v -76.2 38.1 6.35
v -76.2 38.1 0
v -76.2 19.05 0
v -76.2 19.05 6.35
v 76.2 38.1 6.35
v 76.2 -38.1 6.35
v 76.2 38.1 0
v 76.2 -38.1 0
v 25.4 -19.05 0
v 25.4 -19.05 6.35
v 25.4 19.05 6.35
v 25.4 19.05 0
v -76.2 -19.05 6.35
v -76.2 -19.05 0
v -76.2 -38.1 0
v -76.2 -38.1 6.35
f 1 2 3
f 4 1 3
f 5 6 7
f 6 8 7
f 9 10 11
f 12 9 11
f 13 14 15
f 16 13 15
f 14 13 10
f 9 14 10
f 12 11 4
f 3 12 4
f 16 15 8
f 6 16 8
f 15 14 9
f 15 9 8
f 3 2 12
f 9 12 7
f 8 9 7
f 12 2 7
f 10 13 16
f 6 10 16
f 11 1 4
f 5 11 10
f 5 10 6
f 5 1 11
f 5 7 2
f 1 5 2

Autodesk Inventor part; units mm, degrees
ref_plane "YZ Plane" through (0, 0, 0) normal (1, 0, 0) x (0, 1, 0)
ref_plane "XZ Plane" through (0, 0, 0) normal (0, 1, 0) x (-1, 0, 0)
ref_plane "XY Plane" through (0, 0, 0) normal (0, 0, 1) x (1, 0, 0)
sketch "Sketch1" plane through (0, 0, 0) normal (0, 0, 1) x (1, 0, 0)
  line L0 (-76.2, -38.1) -> (76.2, -38.1)
  line L1 (76.2, -38.1) -> (76.2, 38.1)
  line L2 (76.2, 38.1) -> (-76.2, 38.1)
  line L3 (-76.2, 38.1) -> (-76.2, -38.1)
  line L4 (-76.2, -38.1) -> (76.2, 38.1) construction
  line L5 (76.2, -38.1) -> (-76.2, 38.1) construction
  point P0 (0, 0)
  dimension "d0" = 152.4
  dimension "d1" = 76.2
extrude "Extrusion1" add sketch "Sketch1" along normal blind 6.35
sketch "Sketch2" plane through (0, 0, 6.35) normal (0, 0, 1) x (1, 0, 0)
  line L0 (-177.8, -19.05) -> (25.4, -19.05)
  line L1 (25.4, -19.05) -> (25.4, 19.05)
  line L2 (25.4, 19.05) -> (-177.8, 19.05)
  line L3 (-177.8, 19.05) -> (-177.8, -19.05)
  line L4 (-76.2, 38.1) -> (-76.2, -38.1) projected
  line L5 (-177.8, -19.05) -> (25.4, 19.05) construction
  line L6 (25.4, -19.05) -> (-177.8, 19.05) construction
  point P0 (0, 0)
  point P1 (-76.2, 0)
  dimension "d4" = 203.2
  dimension "d5" = 38.1
extrude "Extrusion2" cut sketch "Sketch2" against normal blind 6.35
sketch "Sketch4" plane through (0, 0, 6.35) normal (0, 0, 1) x (1, 0, 0)
  point P0 (0, 0)
properties part number "Back Slide plate"
